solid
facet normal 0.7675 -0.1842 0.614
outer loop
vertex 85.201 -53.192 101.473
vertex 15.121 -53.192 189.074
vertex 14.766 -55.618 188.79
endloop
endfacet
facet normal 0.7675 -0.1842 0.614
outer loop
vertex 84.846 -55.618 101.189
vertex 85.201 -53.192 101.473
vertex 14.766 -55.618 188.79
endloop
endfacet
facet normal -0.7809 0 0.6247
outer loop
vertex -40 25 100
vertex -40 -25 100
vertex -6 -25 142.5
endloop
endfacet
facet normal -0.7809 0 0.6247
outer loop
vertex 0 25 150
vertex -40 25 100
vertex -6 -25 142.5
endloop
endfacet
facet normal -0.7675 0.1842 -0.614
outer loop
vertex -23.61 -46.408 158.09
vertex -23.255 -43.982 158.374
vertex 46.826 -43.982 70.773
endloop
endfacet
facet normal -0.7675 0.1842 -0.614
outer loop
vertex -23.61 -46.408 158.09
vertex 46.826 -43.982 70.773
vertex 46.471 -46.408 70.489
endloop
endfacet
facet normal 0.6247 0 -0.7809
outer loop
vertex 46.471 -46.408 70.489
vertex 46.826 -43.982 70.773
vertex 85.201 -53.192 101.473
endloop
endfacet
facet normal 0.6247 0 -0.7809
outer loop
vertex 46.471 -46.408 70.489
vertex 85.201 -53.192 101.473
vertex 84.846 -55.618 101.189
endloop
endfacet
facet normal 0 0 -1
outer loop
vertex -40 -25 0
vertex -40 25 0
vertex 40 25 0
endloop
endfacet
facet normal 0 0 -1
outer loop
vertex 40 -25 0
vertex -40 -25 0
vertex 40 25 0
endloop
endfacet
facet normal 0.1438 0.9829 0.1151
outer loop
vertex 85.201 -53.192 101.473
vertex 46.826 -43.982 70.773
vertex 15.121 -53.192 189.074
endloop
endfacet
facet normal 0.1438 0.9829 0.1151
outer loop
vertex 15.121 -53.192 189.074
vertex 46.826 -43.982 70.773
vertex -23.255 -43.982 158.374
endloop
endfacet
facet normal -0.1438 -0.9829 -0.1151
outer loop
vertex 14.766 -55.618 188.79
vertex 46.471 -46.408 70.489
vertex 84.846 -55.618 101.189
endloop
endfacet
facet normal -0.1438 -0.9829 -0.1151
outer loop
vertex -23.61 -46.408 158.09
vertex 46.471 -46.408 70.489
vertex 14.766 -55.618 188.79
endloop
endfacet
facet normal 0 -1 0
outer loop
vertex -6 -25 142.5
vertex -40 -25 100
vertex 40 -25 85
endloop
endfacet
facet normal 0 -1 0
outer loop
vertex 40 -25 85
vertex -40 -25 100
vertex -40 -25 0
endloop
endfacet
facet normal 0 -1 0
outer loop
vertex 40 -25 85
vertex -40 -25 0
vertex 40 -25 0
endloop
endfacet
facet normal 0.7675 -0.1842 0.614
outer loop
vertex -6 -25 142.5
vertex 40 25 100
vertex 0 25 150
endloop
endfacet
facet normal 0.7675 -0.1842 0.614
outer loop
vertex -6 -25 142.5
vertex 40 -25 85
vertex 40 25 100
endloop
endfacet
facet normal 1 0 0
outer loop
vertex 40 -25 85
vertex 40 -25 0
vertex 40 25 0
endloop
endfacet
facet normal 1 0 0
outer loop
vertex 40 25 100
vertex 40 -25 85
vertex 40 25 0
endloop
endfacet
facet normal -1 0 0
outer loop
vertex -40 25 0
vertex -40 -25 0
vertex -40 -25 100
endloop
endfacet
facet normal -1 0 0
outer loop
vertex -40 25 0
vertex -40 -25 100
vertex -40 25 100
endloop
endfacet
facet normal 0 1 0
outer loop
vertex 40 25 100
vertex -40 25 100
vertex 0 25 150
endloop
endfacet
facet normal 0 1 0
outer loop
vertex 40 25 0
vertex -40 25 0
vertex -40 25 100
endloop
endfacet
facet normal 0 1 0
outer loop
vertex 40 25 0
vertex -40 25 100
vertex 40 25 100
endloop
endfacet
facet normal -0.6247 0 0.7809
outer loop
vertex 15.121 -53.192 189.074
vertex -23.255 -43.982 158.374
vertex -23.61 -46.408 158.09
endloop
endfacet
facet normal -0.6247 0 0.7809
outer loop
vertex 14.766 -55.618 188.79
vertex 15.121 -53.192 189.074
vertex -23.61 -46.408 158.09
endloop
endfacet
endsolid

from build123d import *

# Parameters (mm, degrees)
F0_W     = 80
F0_H     = 50
F1_DEPTH = 150
F3_DEPTH = 50
F6_W     = 2.4683438241
F6_H     = 112.18418926
F7_DEPTH = 50
F8_DEPTH = 100


with BuildPart() as f1:
    # F0 (on Top) → F1 (new body)
    with BuildSketch(Plane.XY):
        Rectangle(F0_W, F0_H)
    extrude(amount=F1_DEPTH)

    # F2 (on face) → F3 (cut, through all)
    with BuildSketch(Plane.XZ.offset(25)):
        Polygon((-40, 150), (-40, 100), (0, 150), align=None)
    extrude(amount=-F3_DEPTH, mode=Mode.SUBTRACT)



with BuildPart() as f7:
    # F6 (on 3pt) → F7 (new body)
    with BuildSketch(Plane(origin=(67.1536286522, -16.1168708765, 53.7229029218), x_dir=(-0.1438373372, -0.9828884705, -0.1150698697), z_dir=(-0.7675069498, 0.184201668, -0.6140055598))):
        with Locations((29.5846741647, 82.1041800082)):
            Rectangle(F6_W, F6_H)
    extrude(amount=-F7_DEPTH)


with BuildPart() as f1_1:
    add(f1.part)
    # F8 (cut): a face of the model
    f8_faces = [f7.part.faces().sort_by_distance(p)[0] for p in [
        (30.9733670118, -48.5872943735, 129.9233466104),
    ]]
    extrude(f8_faces, amount=F8_DEPTH, mode=Mode.SUBTRACT)


solid = Compound([f7.part, f1_1.part])
